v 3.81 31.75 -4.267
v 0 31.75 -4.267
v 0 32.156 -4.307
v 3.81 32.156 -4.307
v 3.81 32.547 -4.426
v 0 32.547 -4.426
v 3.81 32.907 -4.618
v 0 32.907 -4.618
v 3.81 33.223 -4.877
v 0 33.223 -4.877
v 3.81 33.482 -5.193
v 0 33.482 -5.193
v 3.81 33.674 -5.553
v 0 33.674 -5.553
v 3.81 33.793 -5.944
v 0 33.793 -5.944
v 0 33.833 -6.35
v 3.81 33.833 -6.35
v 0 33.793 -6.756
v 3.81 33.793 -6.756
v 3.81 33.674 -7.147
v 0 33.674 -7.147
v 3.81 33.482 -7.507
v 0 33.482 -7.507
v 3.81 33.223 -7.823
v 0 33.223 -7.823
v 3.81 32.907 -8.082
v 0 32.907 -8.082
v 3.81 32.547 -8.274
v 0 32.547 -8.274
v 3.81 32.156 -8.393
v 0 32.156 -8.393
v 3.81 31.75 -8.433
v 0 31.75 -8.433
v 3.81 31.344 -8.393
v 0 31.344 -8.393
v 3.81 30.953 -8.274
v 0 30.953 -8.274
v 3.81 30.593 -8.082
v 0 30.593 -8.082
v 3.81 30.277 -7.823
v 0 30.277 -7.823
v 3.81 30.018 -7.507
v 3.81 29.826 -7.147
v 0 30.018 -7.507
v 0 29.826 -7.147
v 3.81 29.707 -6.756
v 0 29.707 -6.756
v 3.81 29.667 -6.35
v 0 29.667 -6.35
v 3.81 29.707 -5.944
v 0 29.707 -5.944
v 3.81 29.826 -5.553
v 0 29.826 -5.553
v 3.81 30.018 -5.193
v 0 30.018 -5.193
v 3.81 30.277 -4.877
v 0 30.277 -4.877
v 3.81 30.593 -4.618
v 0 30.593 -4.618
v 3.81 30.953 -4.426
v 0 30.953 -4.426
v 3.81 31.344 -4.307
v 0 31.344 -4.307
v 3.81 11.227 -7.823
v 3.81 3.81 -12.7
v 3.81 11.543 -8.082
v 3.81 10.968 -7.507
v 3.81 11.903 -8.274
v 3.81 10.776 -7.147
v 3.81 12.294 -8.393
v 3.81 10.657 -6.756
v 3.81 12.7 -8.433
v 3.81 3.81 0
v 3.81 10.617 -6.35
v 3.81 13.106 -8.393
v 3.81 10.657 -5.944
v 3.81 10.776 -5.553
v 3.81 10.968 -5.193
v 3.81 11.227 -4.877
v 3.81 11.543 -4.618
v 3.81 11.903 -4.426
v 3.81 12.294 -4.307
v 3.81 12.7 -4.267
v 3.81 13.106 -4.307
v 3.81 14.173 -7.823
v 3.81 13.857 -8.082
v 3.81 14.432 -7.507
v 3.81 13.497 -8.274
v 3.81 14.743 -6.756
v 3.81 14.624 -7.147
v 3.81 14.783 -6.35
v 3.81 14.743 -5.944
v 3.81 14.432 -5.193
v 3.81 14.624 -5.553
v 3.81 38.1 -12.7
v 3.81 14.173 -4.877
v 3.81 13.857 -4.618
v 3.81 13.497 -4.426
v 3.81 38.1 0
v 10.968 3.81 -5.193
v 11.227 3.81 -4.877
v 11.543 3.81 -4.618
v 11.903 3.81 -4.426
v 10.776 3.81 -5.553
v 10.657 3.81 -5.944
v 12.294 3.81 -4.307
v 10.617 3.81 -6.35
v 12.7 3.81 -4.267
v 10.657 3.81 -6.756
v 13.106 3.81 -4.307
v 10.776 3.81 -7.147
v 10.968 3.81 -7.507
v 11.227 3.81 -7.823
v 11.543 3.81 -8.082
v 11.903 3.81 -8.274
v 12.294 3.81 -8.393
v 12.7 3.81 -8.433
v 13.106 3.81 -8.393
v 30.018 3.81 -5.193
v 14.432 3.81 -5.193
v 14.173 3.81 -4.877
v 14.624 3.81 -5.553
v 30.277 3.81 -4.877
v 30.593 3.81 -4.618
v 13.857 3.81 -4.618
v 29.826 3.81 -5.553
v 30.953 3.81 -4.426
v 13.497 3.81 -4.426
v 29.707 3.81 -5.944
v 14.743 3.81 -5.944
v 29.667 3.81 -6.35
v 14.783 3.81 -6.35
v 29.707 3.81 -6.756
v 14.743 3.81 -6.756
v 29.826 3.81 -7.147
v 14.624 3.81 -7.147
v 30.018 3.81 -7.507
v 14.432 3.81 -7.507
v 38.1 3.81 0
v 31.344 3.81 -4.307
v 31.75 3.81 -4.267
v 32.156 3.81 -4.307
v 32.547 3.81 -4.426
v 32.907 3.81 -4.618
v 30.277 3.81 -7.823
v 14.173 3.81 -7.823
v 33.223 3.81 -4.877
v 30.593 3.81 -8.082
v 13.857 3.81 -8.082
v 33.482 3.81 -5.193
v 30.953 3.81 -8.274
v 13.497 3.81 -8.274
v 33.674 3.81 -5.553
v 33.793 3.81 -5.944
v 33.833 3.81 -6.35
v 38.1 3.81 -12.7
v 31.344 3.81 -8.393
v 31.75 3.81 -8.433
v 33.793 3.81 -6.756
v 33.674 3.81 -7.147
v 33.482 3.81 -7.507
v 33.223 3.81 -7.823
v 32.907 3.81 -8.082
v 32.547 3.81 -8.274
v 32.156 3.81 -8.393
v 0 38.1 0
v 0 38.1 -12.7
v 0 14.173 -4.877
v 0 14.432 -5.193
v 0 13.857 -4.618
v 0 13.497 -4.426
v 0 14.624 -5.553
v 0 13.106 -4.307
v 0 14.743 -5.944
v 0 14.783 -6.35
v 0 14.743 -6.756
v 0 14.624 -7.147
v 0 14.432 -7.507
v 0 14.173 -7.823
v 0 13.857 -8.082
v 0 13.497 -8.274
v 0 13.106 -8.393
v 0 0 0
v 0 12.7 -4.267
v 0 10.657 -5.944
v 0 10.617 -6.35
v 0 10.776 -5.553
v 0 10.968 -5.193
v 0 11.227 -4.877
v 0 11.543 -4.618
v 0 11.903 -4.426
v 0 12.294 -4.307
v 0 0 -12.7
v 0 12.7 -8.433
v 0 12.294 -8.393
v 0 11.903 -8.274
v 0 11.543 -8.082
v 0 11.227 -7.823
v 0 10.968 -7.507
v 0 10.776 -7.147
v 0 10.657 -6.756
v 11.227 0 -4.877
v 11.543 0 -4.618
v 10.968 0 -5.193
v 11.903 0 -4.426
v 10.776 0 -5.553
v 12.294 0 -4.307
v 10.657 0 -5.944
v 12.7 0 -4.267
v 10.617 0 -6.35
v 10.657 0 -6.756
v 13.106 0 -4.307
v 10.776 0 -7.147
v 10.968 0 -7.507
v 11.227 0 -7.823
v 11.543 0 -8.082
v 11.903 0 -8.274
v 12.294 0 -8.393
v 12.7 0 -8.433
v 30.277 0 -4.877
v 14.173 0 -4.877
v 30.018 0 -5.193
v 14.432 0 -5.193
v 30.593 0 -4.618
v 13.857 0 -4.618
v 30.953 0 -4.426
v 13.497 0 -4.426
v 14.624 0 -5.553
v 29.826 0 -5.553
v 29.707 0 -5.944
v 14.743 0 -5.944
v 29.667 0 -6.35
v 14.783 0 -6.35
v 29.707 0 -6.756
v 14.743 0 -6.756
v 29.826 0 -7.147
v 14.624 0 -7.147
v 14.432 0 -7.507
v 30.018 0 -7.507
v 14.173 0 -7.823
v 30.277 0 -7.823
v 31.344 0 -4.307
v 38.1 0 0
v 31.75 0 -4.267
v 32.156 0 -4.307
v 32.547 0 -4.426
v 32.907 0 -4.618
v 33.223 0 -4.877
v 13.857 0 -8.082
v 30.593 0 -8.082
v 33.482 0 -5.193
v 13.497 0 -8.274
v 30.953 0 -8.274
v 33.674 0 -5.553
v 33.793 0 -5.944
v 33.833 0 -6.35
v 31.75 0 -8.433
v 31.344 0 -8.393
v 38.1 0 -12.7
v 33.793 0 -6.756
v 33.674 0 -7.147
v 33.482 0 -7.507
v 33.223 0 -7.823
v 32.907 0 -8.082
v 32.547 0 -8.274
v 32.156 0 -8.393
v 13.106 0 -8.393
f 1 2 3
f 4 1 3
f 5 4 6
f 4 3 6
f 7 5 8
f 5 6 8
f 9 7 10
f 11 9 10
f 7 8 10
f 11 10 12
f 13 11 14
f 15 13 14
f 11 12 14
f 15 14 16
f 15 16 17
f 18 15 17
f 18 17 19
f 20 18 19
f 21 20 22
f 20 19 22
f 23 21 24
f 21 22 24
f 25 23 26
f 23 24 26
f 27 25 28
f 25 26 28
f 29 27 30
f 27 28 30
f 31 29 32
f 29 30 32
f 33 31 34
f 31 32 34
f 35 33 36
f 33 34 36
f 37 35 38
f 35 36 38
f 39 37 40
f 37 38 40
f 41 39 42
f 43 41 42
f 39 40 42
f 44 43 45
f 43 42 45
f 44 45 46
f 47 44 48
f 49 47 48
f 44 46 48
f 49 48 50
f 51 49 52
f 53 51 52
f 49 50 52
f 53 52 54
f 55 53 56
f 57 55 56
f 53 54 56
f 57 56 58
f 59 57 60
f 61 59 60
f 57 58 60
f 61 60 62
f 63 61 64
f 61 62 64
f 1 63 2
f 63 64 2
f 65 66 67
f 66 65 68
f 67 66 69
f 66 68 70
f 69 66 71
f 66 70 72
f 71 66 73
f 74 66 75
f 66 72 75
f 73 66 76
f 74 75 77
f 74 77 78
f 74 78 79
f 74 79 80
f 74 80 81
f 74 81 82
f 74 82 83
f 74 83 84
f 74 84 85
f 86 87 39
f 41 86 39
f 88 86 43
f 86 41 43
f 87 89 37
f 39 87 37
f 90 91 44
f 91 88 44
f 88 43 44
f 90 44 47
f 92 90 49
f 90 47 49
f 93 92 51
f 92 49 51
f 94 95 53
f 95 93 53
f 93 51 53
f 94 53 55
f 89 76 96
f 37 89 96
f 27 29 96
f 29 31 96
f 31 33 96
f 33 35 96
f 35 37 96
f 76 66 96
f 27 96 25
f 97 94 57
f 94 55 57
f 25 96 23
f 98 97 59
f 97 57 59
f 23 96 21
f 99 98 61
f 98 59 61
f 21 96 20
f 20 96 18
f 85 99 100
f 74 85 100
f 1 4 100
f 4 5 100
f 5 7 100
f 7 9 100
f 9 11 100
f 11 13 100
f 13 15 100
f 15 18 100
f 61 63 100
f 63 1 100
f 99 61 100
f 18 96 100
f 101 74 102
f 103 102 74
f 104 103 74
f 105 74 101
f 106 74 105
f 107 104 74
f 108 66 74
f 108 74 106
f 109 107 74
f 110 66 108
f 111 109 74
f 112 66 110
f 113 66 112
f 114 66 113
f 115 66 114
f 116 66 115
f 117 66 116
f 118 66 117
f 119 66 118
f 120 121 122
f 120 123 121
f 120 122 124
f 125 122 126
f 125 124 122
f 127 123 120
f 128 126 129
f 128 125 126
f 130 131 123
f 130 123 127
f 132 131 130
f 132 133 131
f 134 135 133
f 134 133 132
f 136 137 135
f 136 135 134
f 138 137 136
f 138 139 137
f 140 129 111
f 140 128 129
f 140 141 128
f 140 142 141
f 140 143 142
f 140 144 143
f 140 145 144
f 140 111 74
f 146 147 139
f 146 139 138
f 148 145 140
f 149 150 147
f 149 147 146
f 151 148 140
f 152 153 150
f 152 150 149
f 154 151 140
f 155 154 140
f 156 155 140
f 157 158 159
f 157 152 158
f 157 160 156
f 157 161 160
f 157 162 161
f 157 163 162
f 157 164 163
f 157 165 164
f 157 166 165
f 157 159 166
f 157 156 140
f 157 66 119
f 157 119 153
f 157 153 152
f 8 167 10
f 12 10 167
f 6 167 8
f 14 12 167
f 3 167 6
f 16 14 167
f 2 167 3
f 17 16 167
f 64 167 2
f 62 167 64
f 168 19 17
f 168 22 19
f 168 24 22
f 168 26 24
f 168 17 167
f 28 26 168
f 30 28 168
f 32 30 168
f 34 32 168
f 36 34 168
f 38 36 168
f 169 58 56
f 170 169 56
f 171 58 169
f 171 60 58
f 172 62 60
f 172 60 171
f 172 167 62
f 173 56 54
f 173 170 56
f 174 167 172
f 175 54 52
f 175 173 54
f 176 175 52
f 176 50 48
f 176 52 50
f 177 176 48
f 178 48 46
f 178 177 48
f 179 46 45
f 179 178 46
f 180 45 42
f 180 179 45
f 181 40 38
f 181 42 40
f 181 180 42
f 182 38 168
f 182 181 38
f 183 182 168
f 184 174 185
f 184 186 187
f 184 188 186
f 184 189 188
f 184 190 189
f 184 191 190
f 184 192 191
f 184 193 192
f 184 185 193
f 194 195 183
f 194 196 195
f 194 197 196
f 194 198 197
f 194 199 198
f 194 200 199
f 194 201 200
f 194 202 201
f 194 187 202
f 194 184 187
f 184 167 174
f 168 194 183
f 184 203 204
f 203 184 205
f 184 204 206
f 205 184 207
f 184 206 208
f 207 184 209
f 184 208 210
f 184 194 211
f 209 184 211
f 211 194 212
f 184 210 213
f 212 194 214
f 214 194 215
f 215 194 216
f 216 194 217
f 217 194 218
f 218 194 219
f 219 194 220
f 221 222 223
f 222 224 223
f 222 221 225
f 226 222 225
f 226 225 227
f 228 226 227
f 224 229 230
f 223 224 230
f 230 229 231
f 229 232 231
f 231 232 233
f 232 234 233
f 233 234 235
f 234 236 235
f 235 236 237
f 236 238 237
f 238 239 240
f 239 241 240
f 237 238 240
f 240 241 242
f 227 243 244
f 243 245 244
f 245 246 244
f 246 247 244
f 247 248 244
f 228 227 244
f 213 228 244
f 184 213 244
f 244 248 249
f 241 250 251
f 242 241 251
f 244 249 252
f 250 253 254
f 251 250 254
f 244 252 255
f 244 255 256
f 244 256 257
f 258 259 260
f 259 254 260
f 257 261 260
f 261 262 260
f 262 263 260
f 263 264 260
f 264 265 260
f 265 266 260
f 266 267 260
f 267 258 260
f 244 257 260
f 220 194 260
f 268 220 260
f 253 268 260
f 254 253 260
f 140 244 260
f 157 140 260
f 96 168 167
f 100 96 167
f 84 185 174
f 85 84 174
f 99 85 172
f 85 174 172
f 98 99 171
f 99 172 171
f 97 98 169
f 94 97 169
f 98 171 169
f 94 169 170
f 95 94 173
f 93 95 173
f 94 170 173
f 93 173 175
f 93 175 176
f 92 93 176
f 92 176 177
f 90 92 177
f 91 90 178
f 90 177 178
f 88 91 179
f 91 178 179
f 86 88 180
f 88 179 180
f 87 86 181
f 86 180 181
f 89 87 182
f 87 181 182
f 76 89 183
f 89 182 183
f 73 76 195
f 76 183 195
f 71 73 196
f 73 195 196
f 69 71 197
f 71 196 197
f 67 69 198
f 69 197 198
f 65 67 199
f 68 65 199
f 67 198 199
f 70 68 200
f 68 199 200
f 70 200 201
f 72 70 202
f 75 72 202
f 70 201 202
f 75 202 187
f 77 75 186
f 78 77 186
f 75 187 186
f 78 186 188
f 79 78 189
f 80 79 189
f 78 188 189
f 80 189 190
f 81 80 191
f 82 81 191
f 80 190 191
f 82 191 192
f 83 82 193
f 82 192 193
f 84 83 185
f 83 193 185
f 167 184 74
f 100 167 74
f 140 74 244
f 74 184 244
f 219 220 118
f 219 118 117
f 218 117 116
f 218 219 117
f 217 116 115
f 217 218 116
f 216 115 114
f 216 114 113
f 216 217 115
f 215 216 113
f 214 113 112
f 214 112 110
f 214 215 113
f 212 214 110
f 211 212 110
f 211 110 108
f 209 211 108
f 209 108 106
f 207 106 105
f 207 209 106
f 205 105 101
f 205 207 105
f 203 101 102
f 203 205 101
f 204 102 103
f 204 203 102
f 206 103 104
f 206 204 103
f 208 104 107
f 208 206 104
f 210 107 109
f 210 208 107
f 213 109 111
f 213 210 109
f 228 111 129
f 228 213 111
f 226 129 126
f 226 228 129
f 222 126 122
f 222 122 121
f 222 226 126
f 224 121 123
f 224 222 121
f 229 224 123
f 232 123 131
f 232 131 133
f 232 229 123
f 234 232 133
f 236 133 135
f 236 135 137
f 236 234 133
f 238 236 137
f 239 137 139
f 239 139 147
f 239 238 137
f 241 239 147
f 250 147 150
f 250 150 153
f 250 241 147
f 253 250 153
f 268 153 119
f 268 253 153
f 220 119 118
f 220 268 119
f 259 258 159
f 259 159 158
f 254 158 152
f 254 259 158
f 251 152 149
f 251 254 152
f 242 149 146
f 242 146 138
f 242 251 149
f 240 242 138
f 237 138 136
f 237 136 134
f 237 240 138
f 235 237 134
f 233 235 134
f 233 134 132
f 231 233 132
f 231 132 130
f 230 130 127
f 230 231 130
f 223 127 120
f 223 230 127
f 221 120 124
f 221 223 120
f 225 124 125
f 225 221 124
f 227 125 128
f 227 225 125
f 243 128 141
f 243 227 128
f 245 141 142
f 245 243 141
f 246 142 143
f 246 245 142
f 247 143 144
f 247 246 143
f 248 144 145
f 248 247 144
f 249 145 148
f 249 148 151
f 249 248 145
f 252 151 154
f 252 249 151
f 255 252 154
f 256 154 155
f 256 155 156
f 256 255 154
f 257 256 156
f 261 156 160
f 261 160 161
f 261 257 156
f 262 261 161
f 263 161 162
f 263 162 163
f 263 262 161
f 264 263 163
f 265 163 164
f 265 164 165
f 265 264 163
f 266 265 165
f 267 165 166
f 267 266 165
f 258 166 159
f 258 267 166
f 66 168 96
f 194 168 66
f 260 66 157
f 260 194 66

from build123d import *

# Parameters (mm, degrees)
SKETCH1_W           = 38.1
SKETCH1_H           = 12.7
SKETCH1_R           = 2.0828
BOSS_EXTRUDE1_DEPTH = 3.81
SKETCH2_W           = 12.7
SKETCH2_H           = 38.1
SKETCH2_R           = 2.0828
BOSS_EXTRUDE2_DEPTH = 3.81


with BuildPart() as part:
    # Sketch1 → Boss-Extrude1 (new body)
    with BuildSketch(Plane(origin=(0, 0, 0), x_dir=(1, 0, 0), z_dir=(0, 1, 0))):
        with Locations((19.05, 6.35)):
            Rectangle(SKETCH1_W, SKETCH1_H)
        with Locations(Location((12.7, 6.35, 0), (0, 0, 90))):
            Circle(SKETCH1_R, mode=Mode.SUBTRACT)
        with Locations(Location((31.75, 6.35, 0), (0, 0, 90))):
            Circle(SKETCH1_R, mode=Mode.SUBTRACT)
    extrude(amount=BOSS_EXTRUDE1_DEPTH)

    # Sketch2 → Boss-Extrude2 (add)
    with BuildSketch(Plane.ZY):
        with Locations((-6.35, 19.05)):
            Rectangle(SKETCH2_W, SKETCH2_H)
        with Locations((-6.35, 31.75)):
            Circle(SKETCH2_R, mode=Mode.SUBTRACT)
        with Locations((-6.35, 12.7)):
            Circle(SKETCH2_R, mode=Mode.SUBTRACT)
    extrude(amount=-BOSS_EXTRUDE2_DEPTH)


solid = part.part
